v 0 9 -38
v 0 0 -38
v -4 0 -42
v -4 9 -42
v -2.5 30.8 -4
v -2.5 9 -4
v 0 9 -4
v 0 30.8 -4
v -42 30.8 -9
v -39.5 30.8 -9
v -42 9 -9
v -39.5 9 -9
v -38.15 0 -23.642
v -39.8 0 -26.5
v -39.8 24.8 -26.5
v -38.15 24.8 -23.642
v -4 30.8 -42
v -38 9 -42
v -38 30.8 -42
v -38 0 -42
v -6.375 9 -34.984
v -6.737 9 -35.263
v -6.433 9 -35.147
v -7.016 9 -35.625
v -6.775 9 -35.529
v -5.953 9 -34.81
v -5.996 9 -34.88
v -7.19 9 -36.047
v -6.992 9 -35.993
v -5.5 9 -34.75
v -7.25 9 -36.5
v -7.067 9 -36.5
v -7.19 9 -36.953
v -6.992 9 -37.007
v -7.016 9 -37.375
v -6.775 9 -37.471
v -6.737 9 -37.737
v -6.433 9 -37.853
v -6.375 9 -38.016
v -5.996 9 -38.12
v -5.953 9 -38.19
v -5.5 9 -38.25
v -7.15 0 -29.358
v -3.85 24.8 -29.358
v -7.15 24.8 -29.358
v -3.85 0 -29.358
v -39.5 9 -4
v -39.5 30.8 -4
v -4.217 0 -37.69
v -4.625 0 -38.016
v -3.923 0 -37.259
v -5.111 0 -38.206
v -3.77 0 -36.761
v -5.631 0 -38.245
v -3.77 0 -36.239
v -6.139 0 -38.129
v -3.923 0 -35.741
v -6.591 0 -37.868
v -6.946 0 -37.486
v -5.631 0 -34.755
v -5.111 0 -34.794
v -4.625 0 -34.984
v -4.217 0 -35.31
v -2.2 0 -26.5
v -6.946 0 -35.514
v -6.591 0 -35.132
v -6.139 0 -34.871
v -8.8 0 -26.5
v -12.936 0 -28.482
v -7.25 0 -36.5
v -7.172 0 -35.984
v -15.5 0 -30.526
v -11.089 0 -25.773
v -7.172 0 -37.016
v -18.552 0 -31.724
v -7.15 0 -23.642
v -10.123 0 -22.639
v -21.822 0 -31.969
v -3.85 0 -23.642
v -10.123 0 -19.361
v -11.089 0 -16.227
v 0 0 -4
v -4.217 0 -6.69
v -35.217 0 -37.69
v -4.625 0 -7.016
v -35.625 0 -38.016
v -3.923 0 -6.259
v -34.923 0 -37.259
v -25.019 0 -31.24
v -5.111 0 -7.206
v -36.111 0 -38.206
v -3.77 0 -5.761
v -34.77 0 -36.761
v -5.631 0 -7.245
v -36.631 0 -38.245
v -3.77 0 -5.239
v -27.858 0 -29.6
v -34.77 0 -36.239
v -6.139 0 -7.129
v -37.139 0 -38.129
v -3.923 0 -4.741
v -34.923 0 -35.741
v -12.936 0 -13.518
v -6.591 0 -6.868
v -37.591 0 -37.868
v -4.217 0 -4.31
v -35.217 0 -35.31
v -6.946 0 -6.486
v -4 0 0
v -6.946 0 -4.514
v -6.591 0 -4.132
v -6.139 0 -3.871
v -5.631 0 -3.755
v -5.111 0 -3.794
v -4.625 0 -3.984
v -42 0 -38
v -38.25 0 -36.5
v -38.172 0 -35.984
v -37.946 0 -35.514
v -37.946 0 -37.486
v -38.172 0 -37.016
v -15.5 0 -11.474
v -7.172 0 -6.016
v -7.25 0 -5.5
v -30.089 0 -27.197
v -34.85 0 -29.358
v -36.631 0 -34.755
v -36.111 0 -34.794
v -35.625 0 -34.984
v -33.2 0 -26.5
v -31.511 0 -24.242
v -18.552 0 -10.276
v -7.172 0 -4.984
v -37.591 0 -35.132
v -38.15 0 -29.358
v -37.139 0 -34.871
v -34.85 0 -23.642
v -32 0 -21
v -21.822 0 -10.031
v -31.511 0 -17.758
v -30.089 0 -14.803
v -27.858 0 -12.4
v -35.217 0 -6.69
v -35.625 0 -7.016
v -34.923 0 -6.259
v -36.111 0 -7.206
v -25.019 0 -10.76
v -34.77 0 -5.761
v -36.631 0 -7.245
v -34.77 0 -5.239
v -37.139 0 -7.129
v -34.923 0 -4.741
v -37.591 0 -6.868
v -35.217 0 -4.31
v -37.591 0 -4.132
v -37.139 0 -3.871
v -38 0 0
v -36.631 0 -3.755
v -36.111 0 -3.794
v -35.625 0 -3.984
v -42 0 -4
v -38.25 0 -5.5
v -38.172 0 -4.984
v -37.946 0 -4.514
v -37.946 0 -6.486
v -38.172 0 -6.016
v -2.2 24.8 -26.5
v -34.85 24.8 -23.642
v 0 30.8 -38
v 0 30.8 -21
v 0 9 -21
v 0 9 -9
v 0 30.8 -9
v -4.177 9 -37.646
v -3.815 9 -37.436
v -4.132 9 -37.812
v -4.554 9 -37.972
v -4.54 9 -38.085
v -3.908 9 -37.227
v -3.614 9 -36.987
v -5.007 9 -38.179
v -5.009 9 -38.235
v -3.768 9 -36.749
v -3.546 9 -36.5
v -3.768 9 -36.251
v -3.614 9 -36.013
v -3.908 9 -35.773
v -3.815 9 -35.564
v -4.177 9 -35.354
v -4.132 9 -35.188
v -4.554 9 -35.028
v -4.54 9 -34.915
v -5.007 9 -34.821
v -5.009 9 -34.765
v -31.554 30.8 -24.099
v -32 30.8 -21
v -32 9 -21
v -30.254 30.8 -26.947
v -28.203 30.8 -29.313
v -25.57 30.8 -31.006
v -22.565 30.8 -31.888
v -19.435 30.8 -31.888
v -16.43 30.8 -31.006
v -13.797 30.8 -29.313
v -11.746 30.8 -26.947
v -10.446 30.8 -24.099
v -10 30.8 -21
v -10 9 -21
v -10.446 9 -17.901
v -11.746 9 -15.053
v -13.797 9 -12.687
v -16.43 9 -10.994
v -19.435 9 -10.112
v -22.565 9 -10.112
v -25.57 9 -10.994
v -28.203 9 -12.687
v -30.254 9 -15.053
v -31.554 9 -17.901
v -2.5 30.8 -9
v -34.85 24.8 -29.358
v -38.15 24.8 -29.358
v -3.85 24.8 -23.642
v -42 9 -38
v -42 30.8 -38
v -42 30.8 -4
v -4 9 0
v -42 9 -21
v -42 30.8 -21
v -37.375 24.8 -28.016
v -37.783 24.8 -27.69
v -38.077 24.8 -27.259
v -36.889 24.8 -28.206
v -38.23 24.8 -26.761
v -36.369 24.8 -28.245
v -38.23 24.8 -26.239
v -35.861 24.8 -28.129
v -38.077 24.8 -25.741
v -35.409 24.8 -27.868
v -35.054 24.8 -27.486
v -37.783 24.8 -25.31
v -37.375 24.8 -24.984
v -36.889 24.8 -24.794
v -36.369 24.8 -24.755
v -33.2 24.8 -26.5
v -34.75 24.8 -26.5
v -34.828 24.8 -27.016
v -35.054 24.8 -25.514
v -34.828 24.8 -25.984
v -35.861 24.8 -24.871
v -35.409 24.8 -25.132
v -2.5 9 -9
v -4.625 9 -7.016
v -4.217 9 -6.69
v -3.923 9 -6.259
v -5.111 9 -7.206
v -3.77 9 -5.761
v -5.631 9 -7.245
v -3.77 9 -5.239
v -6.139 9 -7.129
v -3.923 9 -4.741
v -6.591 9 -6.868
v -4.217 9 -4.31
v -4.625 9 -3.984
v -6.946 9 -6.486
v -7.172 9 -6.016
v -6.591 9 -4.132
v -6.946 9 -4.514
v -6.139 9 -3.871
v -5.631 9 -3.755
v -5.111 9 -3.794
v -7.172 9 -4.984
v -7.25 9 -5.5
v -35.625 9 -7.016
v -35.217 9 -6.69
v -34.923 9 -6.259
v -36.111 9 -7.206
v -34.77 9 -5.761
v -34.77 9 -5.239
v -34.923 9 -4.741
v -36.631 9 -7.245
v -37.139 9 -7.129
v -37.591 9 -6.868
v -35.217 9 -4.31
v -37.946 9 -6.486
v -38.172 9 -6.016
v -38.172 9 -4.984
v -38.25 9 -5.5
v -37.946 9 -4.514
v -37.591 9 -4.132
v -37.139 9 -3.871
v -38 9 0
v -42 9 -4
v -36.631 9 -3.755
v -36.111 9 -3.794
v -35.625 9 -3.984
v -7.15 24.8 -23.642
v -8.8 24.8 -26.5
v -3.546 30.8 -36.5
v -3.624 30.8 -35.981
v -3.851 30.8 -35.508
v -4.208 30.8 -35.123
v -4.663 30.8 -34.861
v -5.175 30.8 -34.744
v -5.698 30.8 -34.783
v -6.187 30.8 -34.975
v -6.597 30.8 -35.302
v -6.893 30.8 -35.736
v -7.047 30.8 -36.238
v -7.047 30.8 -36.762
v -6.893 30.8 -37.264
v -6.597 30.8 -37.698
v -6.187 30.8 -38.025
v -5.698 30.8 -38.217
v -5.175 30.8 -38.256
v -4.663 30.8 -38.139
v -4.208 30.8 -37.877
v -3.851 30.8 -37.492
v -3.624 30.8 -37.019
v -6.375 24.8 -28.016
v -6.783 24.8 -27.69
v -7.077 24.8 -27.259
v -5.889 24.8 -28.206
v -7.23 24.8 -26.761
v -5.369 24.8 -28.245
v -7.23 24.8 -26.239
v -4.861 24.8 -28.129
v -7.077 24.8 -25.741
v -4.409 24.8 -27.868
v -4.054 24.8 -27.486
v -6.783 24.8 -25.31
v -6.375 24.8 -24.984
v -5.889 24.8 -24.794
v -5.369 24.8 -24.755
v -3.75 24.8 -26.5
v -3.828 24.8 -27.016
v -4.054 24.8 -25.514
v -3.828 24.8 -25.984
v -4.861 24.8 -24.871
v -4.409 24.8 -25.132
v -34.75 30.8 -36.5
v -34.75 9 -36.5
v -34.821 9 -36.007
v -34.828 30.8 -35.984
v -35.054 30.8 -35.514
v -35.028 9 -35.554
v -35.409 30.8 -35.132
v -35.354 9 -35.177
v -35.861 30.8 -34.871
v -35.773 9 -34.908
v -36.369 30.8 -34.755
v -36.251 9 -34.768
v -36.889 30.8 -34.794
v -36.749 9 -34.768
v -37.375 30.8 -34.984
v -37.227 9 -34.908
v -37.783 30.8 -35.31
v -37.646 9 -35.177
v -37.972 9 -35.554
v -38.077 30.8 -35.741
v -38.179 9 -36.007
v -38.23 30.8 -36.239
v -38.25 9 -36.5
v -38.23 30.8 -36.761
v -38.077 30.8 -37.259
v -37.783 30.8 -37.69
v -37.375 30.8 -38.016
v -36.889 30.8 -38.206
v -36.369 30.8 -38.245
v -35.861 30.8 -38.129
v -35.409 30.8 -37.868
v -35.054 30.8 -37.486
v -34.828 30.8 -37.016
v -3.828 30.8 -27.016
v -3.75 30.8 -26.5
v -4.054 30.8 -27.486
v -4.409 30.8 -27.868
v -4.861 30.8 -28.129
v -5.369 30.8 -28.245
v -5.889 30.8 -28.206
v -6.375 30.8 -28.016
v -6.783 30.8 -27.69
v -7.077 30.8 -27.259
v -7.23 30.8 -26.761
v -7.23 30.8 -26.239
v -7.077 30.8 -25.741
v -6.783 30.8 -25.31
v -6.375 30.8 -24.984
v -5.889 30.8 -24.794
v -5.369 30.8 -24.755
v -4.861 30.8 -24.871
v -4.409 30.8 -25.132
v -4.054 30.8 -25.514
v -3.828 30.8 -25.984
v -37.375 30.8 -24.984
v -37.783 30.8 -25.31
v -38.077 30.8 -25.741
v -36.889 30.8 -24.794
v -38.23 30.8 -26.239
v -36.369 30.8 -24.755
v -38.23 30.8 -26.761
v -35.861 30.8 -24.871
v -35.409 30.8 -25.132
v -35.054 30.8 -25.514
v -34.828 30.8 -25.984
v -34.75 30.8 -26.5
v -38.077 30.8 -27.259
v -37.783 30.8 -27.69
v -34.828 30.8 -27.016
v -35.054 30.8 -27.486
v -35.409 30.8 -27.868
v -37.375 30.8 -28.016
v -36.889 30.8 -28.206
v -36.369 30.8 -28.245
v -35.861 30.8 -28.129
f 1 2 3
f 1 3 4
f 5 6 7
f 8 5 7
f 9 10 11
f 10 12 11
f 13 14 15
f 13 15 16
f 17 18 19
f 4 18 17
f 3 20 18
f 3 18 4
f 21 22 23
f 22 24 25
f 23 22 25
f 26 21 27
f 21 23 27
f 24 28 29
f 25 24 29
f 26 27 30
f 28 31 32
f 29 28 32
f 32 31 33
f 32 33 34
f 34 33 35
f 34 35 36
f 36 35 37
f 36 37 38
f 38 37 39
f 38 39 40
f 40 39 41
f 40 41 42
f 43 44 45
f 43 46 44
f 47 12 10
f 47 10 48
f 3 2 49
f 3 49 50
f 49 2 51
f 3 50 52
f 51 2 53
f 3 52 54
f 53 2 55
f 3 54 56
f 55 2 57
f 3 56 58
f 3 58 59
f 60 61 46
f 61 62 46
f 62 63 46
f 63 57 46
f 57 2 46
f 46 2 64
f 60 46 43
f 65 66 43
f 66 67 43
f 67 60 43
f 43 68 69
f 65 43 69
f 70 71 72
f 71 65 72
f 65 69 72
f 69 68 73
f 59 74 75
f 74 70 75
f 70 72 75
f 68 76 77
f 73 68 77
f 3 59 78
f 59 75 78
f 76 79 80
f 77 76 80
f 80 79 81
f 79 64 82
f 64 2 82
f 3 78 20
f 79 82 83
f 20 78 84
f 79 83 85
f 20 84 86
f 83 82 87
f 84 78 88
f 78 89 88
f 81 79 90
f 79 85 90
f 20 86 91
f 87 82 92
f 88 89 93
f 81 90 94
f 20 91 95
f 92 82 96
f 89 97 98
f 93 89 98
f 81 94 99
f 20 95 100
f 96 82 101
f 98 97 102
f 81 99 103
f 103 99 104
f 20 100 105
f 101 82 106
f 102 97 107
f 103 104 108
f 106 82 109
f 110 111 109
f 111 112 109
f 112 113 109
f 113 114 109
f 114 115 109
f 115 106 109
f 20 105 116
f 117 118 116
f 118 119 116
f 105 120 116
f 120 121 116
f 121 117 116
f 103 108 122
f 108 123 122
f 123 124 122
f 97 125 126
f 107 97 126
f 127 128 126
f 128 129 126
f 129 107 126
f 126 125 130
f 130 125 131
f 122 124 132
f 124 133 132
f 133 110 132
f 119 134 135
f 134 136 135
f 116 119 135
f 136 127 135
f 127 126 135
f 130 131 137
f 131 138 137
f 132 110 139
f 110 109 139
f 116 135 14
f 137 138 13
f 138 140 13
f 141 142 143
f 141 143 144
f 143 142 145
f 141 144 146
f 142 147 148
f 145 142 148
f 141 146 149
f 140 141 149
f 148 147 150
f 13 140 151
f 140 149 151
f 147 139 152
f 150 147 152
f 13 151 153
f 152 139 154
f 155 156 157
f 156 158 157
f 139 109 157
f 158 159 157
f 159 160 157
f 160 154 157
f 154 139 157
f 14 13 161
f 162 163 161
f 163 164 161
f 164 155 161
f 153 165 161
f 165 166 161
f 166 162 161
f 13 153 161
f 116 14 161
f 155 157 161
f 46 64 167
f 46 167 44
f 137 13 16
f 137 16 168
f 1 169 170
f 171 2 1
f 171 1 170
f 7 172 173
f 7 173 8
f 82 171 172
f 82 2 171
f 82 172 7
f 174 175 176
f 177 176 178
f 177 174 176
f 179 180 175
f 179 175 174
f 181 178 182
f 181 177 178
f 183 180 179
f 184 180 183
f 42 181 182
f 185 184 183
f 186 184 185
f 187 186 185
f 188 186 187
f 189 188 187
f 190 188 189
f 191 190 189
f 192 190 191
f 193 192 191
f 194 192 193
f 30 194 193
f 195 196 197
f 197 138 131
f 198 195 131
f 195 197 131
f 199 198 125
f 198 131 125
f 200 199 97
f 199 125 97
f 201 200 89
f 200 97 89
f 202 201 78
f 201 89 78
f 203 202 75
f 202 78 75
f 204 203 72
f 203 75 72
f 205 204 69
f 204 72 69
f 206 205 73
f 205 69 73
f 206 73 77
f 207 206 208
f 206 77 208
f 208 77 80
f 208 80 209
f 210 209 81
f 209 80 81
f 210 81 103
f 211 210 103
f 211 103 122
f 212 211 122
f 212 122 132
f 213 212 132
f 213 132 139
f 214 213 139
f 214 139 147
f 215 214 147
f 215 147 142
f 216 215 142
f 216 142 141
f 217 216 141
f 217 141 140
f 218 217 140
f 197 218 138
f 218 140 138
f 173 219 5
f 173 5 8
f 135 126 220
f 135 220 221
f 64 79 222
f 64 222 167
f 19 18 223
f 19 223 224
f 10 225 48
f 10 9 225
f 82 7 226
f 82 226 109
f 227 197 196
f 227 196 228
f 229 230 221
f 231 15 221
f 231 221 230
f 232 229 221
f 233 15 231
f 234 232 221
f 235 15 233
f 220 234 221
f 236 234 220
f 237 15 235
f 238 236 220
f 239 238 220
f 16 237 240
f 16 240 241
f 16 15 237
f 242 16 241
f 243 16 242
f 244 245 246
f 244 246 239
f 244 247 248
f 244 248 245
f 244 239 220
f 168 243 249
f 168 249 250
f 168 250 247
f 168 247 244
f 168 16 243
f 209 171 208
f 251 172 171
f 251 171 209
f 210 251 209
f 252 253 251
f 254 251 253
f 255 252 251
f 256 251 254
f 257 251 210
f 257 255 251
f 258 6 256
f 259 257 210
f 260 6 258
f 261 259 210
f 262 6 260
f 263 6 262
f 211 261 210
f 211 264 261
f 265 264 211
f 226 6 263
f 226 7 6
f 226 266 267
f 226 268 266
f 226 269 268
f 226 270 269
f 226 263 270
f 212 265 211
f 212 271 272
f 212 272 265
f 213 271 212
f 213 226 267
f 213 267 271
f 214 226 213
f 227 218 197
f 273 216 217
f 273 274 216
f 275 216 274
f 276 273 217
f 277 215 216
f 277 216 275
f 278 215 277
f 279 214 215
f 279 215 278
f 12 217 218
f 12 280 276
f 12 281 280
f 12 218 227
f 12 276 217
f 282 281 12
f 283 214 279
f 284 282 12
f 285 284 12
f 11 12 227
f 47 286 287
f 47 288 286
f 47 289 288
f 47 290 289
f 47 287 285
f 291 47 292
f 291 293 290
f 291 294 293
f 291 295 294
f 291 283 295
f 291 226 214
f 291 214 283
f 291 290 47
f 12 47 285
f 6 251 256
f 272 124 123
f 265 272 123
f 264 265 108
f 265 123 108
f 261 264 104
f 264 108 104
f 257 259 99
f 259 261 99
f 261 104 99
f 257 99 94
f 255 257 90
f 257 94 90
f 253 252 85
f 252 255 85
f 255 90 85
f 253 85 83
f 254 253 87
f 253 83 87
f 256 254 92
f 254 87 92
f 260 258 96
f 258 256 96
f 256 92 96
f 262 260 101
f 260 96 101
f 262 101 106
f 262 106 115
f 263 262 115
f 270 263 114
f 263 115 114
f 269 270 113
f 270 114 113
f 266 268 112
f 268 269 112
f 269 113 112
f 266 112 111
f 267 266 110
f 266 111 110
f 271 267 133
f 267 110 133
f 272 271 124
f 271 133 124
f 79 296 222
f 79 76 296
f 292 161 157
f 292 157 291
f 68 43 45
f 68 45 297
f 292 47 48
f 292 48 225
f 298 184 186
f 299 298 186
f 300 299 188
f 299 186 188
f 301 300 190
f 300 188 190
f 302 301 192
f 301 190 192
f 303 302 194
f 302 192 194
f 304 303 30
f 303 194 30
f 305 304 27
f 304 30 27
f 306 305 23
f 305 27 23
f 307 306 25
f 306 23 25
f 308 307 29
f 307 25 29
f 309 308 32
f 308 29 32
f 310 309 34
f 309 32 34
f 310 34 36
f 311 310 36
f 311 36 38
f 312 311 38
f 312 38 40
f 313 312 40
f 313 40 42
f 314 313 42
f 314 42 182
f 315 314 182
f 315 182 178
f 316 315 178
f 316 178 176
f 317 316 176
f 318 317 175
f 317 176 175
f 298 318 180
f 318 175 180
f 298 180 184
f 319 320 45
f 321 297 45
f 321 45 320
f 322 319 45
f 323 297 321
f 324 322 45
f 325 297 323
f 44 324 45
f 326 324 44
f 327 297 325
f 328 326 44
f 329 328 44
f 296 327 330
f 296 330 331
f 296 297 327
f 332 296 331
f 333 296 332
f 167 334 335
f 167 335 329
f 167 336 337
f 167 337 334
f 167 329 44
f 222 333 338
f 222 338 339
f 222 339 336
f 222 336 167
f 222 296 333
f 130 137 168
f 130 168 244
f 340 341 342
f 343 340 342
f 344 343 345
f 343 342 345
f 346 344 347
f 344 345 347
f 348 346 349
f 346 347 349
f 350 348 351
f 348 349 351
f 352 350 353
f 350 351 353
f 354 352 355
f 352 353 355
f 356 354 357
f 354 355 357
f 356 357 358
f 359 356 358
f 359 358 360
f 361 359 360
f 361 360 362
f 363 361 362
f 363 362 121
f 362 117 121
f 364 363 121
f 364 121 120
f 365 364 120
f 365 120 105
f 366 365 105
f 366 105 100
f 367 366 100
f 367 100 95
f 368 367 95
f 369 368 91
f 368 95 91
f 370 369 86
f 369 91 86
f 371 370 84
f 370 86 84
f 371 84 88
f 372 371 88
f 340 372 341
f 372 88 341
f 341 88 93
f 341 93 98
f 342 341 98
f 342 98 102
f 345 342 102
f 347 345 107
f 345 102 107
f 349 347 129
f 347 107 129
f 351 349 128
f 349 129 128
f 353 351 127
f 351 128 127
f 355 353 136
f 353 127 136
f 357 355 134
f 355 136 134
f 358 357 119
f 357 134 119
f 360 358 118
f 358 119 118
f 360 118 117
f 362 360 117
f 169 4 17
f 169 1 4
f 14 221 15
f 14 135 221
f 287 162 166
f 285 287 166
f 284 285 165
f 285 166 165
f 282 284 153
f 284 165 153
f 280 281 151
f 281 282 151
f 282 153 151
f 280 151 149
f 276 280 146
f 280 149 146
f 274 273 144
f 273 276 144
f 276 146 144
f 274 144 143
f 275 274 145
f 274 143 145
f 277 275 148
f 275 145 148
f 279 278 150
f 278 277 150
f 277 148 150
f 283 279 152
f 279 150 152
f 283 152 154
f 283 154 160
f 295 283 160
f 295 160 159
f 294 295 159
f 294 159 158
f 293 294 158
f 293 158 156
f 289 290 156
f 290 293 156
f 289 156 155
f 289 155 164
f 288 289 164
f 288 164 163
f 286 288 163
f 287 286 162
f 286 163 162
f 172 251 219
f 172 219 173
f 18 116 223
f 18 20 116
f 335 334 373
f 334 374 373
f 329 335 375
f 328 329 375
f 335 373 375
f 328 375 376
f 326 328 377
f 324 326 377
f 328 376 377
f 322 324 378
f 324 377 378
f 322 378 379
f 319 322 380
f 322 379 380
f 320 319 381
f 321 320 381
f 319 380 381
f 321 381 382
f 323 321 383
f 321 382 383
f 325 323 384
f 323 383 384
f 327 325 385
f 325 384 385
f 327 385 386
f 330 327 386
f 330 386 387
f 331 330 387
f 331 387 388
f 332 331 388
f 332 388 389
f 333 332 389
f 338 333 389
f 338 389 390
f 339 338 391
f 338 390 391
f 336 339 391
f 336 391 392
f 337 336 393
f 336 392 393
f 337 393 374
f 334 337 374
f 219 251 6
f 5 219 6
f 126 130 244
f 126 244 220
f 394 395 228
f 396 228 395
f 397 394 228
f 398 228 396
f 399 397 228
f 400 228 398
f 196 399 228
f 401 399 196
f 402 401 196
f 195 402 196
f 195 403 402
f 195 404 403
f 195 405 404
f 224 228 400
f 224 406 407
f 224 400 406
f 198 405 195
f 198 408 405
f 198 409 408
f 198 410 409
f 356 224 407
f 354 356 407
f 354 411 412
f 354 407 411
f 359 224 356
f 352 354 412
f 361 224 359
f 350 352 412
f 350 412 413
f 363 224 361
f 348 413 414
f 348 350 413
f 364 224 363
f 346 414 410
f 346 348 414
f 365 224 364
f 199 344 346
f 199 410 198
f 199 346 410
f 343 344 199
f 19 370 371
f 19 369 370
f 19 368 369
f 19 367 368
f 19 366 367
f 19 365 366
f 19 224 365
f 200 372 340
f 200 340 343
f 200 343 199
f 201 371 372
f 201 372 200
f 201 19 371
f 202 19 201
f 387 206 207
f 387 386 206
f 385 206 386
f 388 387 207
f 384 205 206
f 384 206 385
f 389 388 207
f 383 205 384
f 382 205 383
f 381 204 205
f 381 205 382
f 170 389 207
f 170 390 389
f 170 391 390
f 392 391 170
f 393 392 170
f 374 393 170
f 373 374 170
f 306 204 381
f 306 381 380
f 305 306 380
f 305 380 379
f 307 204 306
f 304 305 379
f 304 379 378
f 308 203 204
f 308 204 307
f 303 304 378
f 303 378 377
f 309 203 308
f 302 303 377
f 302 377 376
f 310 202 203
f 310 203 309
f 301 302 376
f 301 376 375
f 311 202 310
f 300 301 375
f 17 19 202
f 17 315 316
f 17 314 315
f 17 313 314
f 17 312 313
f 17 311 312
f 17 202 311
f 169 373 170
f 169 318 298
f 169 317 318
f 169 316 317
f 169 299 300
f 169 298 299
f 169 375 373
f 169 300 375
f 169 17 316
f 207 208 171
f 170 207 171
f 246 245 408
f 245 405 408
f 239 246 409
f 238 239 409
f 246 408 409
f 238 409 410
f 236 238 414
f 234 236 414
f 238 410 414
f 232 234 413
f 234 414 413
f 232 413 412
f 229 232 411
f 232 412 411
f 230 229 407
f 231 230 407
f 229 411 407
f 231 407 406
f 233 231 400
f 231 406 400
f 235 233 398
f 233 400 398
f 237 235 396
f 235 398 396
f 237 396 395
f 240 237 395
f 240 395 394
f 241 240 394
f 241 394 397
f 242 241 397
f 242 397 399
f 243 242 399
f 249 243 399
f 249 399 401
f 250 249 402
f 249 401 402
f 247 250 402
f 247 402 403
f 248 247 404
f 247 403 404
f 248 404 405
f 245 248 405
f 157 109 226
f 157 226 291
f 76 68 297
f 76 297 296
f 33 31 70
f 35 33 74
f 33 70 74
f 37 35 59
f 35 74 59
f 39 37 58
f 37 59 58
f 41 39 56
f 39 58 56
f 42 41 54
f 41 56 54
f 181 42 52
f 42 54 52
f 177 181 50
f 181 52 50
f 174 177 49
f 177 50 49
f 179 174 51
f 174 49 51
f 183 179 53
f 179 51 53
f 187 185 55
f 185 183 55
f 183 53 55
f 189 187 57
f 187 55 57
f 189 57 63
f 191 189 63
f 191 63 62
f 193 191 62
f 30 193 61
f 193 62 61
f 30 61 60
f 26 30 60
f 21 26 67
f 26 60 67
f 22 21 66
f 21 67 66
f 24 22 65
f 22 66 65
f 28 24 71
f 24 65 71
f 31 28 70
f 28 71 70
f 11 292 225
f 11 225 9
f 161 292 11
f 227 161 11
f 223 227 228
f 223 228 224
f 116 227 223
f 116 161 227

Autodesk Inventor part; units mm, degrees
ref_plane "YZ Plane" through (0, 0, 0) normal (1, 0, 0) x (0, 1, 0)
ref_plane "XZ Plane" through (0, 0, 0) normal (0, 1, 0) x (-1, 0, 0)
ref_plane "XY Plane" through (0, 0, 0) normal (0, 0, 1) x (1, 0, 0)
sketch "Sketch1" plane through (0, 0, 0) normal (0, 1, 0) x (-1, 0, 0)
  line L0 (0, 0) -> (42, 0)
  line L1 (42, 0) -> (42, -42)
  line L2 (42, -42) -> (0, -42)
  line L3 (0, -42) -> (0, 0)
  circle A0 centre (5.5, -5.5) radius 1.75
  circle A1 centre (5.5, -36.5) radius 1.75
  circle A2 centre (36.5, -5.5) radius 1.75
  circle A3 centre (36.5, -36.5) radius 1.75
  circle A4 centre (21, -21) radius 11
  point P0 (0, -31)
  point P1 (31, 0)
  point P2 (31, -31)
  dimension "d0" = 42
  dimension "d1" = 42
  dimension "d2" = 3.5
  dimension "d5" = 31
  dimension "d8" = 31
  dimension "d11" = 5.5
  dimension "d12" = 5.5
  dimension "d13" = 22
extrude "Extrusion1" add sketch "Sketch1" along normal blind 9
sketch "Sketch2" plane through (0, 9, 0) normal (0, 1, 0) x (1, 0, 0)
  line L0 (0, 42) -> (-42, 42) projected
  line L1 (-42, 4) -> (-42, 42)
  line L2 (-42, 42) -> (0, 42)
  line L3 (0, 42) -> (0, 4)
  circle A0 centre (-21, 21) radius 11 projected
  arc A1 (-10, 21) -> (-32, 21) centre (-21, 21) ccw
  line L4 (-42, 0) -> (0, 0) projected
  line L5 (-39.5, 9) -> (-39.5, 4)
  line L6 (-39.5, 4) -> (-42, 4)
  line L7 (-2.5, 9) -> (-2.5, 4)
  line L8 (-2.5, 4) -> (0, 4)
  circle A2 centre (-36.5, 36.5) radius 1.75 projected
  circle A3 centre (-36.5, 36.5) radius 1.75
  circle A4 centre (-5.3062, 36.5) radius 1.7607
  line L9 (0, 0) -> (-32, 0)
  line L10 (-39.5, 0) -> (-42, 0)
  line L11 (-2.5, 9) -> (0, 9)
  line L12 (-39.5, 9) -> (-42, 9)
  line L13 (-42, 42) -> (-42, 0) projected
  line L14 (-32, 21) -> (-42, 21)
  line L15 (-10, 21) -> (0, 21)
  point P0 (-42, 12)
  point P1 (0, 12)
  dimension "d19" = 4
  dimension "d20" = 2.5
  dimension "d25" = 2.5
  dimension "d34" = 5
  dimension "d36" = 5
  dimension "d37" = 4
chamfer "Chamfer1" distance 4 angle 45 4 edges at (0, 4.5, -42) (-42, 4.5, -42) (-42, 4.5, 0) (0, 4.5, 0)
extrude "Extrusion2" add sketch "Sketch2" along normal blind 21.8 contours L3 L15 A0 L14 L1 L0 | L1 L12 L5 L6 | L3 L8 L7 L11
chamfer "Chamfer5" distance 4 angle 45 1 edges at (-42, 19.9, -42)
chamfer "Chamfer6" distance 4 angle 45 1 edges at (0, 19.9, -42)
sketch "Sketch3" plane through (0, 30.8, 0) normal (0, 1, 0) x (1, 0, 0)
  circle A0 centre (-36.5, 26.5) radius 1.75
  circle A1 centre (-36.5, 36.5) radius 1.75 projected
  circle A2 centre (-5.5, 26.5) radius 1.75
  circle A3 centre (-5.3062, 36.5) radius 1.7607 projected
  point P0 (0, 0)
  dimension "d48" = 3.5
  dimension "d49" = 10
  dimension "d50" = 3.5
  dimension "d51" = 10
extrude "Extrusion3" cut sketch "Sketch3" against normal blind 30.8 contours A0 | A2
sketch "Sketch4" plane through (0, 0, 0) normal (0, -1, 0) x (1, 0, 0)
  circle A0 centre (-5.5, -26.5) radius 1.75 projected
  line L0 (-3.85, -29.3579) -> (-7.15, -29.3579)
  line L1 (-7.15, -29.3579) -> (-8.8, -26.5)
  line L2 (-8.8, -26.5) -> (-7.15, -23.6421)
  line L3 (-7.15, -23.6421) -> (-3.85, -23.6421)
  line L4 (-3.85, -23.6421) -> (-2.2, -26.5)
  line L5 (-2.2, -26.5) -> (-3.85, -29.3579)
  line L6 (-4, -42) -> (-38, -42) projected
  line L7 (-34.85, -29.3579) -> (-38.15, -29.3579)
  line L8 (-38.15, -29.3579) -> (-39.8, -26.5)
  line L9 (-39.8, -26.5) -> (-38.15, -23.6421)
  line L10 (-38.15, -23.6421) -> (-34.85, -23.6421)
  line L11 (-34.85, -23.6421) -> (-33.2, -26.5)
  line L12 (-33.2, -26.5) -> (-34.85, -29.3579)
  point P0 (0, 0)
  point P1 (-36.5, -26.5)
  point P2 (-36.5, -26.5)
  dimension "d55" = 5.7158
  dimension "d56" = 0
  dimension "d59" = 31
extrude "Extrusion4" cut sketch "Sketch4" against normal blind 24.8 contours A0 | L0 L1 L2 L3 L4 L5 | L7 L8 L9 L10 L11 L12
equation "\"d11\" = -0.5 * d5 + 0.5 * d1"
equation "\"d12\" = d11"
equation "\"d25\" = d20"
equation "\"d36\" = d34"
equation "\"d37\" = d19"
equation "\"d51\" = d49"
equation "\"d23\" = d19"
equation "\"d24\" = d22"
equation "\"d22\" = 12"
properties part number "Base for NEMA17"
